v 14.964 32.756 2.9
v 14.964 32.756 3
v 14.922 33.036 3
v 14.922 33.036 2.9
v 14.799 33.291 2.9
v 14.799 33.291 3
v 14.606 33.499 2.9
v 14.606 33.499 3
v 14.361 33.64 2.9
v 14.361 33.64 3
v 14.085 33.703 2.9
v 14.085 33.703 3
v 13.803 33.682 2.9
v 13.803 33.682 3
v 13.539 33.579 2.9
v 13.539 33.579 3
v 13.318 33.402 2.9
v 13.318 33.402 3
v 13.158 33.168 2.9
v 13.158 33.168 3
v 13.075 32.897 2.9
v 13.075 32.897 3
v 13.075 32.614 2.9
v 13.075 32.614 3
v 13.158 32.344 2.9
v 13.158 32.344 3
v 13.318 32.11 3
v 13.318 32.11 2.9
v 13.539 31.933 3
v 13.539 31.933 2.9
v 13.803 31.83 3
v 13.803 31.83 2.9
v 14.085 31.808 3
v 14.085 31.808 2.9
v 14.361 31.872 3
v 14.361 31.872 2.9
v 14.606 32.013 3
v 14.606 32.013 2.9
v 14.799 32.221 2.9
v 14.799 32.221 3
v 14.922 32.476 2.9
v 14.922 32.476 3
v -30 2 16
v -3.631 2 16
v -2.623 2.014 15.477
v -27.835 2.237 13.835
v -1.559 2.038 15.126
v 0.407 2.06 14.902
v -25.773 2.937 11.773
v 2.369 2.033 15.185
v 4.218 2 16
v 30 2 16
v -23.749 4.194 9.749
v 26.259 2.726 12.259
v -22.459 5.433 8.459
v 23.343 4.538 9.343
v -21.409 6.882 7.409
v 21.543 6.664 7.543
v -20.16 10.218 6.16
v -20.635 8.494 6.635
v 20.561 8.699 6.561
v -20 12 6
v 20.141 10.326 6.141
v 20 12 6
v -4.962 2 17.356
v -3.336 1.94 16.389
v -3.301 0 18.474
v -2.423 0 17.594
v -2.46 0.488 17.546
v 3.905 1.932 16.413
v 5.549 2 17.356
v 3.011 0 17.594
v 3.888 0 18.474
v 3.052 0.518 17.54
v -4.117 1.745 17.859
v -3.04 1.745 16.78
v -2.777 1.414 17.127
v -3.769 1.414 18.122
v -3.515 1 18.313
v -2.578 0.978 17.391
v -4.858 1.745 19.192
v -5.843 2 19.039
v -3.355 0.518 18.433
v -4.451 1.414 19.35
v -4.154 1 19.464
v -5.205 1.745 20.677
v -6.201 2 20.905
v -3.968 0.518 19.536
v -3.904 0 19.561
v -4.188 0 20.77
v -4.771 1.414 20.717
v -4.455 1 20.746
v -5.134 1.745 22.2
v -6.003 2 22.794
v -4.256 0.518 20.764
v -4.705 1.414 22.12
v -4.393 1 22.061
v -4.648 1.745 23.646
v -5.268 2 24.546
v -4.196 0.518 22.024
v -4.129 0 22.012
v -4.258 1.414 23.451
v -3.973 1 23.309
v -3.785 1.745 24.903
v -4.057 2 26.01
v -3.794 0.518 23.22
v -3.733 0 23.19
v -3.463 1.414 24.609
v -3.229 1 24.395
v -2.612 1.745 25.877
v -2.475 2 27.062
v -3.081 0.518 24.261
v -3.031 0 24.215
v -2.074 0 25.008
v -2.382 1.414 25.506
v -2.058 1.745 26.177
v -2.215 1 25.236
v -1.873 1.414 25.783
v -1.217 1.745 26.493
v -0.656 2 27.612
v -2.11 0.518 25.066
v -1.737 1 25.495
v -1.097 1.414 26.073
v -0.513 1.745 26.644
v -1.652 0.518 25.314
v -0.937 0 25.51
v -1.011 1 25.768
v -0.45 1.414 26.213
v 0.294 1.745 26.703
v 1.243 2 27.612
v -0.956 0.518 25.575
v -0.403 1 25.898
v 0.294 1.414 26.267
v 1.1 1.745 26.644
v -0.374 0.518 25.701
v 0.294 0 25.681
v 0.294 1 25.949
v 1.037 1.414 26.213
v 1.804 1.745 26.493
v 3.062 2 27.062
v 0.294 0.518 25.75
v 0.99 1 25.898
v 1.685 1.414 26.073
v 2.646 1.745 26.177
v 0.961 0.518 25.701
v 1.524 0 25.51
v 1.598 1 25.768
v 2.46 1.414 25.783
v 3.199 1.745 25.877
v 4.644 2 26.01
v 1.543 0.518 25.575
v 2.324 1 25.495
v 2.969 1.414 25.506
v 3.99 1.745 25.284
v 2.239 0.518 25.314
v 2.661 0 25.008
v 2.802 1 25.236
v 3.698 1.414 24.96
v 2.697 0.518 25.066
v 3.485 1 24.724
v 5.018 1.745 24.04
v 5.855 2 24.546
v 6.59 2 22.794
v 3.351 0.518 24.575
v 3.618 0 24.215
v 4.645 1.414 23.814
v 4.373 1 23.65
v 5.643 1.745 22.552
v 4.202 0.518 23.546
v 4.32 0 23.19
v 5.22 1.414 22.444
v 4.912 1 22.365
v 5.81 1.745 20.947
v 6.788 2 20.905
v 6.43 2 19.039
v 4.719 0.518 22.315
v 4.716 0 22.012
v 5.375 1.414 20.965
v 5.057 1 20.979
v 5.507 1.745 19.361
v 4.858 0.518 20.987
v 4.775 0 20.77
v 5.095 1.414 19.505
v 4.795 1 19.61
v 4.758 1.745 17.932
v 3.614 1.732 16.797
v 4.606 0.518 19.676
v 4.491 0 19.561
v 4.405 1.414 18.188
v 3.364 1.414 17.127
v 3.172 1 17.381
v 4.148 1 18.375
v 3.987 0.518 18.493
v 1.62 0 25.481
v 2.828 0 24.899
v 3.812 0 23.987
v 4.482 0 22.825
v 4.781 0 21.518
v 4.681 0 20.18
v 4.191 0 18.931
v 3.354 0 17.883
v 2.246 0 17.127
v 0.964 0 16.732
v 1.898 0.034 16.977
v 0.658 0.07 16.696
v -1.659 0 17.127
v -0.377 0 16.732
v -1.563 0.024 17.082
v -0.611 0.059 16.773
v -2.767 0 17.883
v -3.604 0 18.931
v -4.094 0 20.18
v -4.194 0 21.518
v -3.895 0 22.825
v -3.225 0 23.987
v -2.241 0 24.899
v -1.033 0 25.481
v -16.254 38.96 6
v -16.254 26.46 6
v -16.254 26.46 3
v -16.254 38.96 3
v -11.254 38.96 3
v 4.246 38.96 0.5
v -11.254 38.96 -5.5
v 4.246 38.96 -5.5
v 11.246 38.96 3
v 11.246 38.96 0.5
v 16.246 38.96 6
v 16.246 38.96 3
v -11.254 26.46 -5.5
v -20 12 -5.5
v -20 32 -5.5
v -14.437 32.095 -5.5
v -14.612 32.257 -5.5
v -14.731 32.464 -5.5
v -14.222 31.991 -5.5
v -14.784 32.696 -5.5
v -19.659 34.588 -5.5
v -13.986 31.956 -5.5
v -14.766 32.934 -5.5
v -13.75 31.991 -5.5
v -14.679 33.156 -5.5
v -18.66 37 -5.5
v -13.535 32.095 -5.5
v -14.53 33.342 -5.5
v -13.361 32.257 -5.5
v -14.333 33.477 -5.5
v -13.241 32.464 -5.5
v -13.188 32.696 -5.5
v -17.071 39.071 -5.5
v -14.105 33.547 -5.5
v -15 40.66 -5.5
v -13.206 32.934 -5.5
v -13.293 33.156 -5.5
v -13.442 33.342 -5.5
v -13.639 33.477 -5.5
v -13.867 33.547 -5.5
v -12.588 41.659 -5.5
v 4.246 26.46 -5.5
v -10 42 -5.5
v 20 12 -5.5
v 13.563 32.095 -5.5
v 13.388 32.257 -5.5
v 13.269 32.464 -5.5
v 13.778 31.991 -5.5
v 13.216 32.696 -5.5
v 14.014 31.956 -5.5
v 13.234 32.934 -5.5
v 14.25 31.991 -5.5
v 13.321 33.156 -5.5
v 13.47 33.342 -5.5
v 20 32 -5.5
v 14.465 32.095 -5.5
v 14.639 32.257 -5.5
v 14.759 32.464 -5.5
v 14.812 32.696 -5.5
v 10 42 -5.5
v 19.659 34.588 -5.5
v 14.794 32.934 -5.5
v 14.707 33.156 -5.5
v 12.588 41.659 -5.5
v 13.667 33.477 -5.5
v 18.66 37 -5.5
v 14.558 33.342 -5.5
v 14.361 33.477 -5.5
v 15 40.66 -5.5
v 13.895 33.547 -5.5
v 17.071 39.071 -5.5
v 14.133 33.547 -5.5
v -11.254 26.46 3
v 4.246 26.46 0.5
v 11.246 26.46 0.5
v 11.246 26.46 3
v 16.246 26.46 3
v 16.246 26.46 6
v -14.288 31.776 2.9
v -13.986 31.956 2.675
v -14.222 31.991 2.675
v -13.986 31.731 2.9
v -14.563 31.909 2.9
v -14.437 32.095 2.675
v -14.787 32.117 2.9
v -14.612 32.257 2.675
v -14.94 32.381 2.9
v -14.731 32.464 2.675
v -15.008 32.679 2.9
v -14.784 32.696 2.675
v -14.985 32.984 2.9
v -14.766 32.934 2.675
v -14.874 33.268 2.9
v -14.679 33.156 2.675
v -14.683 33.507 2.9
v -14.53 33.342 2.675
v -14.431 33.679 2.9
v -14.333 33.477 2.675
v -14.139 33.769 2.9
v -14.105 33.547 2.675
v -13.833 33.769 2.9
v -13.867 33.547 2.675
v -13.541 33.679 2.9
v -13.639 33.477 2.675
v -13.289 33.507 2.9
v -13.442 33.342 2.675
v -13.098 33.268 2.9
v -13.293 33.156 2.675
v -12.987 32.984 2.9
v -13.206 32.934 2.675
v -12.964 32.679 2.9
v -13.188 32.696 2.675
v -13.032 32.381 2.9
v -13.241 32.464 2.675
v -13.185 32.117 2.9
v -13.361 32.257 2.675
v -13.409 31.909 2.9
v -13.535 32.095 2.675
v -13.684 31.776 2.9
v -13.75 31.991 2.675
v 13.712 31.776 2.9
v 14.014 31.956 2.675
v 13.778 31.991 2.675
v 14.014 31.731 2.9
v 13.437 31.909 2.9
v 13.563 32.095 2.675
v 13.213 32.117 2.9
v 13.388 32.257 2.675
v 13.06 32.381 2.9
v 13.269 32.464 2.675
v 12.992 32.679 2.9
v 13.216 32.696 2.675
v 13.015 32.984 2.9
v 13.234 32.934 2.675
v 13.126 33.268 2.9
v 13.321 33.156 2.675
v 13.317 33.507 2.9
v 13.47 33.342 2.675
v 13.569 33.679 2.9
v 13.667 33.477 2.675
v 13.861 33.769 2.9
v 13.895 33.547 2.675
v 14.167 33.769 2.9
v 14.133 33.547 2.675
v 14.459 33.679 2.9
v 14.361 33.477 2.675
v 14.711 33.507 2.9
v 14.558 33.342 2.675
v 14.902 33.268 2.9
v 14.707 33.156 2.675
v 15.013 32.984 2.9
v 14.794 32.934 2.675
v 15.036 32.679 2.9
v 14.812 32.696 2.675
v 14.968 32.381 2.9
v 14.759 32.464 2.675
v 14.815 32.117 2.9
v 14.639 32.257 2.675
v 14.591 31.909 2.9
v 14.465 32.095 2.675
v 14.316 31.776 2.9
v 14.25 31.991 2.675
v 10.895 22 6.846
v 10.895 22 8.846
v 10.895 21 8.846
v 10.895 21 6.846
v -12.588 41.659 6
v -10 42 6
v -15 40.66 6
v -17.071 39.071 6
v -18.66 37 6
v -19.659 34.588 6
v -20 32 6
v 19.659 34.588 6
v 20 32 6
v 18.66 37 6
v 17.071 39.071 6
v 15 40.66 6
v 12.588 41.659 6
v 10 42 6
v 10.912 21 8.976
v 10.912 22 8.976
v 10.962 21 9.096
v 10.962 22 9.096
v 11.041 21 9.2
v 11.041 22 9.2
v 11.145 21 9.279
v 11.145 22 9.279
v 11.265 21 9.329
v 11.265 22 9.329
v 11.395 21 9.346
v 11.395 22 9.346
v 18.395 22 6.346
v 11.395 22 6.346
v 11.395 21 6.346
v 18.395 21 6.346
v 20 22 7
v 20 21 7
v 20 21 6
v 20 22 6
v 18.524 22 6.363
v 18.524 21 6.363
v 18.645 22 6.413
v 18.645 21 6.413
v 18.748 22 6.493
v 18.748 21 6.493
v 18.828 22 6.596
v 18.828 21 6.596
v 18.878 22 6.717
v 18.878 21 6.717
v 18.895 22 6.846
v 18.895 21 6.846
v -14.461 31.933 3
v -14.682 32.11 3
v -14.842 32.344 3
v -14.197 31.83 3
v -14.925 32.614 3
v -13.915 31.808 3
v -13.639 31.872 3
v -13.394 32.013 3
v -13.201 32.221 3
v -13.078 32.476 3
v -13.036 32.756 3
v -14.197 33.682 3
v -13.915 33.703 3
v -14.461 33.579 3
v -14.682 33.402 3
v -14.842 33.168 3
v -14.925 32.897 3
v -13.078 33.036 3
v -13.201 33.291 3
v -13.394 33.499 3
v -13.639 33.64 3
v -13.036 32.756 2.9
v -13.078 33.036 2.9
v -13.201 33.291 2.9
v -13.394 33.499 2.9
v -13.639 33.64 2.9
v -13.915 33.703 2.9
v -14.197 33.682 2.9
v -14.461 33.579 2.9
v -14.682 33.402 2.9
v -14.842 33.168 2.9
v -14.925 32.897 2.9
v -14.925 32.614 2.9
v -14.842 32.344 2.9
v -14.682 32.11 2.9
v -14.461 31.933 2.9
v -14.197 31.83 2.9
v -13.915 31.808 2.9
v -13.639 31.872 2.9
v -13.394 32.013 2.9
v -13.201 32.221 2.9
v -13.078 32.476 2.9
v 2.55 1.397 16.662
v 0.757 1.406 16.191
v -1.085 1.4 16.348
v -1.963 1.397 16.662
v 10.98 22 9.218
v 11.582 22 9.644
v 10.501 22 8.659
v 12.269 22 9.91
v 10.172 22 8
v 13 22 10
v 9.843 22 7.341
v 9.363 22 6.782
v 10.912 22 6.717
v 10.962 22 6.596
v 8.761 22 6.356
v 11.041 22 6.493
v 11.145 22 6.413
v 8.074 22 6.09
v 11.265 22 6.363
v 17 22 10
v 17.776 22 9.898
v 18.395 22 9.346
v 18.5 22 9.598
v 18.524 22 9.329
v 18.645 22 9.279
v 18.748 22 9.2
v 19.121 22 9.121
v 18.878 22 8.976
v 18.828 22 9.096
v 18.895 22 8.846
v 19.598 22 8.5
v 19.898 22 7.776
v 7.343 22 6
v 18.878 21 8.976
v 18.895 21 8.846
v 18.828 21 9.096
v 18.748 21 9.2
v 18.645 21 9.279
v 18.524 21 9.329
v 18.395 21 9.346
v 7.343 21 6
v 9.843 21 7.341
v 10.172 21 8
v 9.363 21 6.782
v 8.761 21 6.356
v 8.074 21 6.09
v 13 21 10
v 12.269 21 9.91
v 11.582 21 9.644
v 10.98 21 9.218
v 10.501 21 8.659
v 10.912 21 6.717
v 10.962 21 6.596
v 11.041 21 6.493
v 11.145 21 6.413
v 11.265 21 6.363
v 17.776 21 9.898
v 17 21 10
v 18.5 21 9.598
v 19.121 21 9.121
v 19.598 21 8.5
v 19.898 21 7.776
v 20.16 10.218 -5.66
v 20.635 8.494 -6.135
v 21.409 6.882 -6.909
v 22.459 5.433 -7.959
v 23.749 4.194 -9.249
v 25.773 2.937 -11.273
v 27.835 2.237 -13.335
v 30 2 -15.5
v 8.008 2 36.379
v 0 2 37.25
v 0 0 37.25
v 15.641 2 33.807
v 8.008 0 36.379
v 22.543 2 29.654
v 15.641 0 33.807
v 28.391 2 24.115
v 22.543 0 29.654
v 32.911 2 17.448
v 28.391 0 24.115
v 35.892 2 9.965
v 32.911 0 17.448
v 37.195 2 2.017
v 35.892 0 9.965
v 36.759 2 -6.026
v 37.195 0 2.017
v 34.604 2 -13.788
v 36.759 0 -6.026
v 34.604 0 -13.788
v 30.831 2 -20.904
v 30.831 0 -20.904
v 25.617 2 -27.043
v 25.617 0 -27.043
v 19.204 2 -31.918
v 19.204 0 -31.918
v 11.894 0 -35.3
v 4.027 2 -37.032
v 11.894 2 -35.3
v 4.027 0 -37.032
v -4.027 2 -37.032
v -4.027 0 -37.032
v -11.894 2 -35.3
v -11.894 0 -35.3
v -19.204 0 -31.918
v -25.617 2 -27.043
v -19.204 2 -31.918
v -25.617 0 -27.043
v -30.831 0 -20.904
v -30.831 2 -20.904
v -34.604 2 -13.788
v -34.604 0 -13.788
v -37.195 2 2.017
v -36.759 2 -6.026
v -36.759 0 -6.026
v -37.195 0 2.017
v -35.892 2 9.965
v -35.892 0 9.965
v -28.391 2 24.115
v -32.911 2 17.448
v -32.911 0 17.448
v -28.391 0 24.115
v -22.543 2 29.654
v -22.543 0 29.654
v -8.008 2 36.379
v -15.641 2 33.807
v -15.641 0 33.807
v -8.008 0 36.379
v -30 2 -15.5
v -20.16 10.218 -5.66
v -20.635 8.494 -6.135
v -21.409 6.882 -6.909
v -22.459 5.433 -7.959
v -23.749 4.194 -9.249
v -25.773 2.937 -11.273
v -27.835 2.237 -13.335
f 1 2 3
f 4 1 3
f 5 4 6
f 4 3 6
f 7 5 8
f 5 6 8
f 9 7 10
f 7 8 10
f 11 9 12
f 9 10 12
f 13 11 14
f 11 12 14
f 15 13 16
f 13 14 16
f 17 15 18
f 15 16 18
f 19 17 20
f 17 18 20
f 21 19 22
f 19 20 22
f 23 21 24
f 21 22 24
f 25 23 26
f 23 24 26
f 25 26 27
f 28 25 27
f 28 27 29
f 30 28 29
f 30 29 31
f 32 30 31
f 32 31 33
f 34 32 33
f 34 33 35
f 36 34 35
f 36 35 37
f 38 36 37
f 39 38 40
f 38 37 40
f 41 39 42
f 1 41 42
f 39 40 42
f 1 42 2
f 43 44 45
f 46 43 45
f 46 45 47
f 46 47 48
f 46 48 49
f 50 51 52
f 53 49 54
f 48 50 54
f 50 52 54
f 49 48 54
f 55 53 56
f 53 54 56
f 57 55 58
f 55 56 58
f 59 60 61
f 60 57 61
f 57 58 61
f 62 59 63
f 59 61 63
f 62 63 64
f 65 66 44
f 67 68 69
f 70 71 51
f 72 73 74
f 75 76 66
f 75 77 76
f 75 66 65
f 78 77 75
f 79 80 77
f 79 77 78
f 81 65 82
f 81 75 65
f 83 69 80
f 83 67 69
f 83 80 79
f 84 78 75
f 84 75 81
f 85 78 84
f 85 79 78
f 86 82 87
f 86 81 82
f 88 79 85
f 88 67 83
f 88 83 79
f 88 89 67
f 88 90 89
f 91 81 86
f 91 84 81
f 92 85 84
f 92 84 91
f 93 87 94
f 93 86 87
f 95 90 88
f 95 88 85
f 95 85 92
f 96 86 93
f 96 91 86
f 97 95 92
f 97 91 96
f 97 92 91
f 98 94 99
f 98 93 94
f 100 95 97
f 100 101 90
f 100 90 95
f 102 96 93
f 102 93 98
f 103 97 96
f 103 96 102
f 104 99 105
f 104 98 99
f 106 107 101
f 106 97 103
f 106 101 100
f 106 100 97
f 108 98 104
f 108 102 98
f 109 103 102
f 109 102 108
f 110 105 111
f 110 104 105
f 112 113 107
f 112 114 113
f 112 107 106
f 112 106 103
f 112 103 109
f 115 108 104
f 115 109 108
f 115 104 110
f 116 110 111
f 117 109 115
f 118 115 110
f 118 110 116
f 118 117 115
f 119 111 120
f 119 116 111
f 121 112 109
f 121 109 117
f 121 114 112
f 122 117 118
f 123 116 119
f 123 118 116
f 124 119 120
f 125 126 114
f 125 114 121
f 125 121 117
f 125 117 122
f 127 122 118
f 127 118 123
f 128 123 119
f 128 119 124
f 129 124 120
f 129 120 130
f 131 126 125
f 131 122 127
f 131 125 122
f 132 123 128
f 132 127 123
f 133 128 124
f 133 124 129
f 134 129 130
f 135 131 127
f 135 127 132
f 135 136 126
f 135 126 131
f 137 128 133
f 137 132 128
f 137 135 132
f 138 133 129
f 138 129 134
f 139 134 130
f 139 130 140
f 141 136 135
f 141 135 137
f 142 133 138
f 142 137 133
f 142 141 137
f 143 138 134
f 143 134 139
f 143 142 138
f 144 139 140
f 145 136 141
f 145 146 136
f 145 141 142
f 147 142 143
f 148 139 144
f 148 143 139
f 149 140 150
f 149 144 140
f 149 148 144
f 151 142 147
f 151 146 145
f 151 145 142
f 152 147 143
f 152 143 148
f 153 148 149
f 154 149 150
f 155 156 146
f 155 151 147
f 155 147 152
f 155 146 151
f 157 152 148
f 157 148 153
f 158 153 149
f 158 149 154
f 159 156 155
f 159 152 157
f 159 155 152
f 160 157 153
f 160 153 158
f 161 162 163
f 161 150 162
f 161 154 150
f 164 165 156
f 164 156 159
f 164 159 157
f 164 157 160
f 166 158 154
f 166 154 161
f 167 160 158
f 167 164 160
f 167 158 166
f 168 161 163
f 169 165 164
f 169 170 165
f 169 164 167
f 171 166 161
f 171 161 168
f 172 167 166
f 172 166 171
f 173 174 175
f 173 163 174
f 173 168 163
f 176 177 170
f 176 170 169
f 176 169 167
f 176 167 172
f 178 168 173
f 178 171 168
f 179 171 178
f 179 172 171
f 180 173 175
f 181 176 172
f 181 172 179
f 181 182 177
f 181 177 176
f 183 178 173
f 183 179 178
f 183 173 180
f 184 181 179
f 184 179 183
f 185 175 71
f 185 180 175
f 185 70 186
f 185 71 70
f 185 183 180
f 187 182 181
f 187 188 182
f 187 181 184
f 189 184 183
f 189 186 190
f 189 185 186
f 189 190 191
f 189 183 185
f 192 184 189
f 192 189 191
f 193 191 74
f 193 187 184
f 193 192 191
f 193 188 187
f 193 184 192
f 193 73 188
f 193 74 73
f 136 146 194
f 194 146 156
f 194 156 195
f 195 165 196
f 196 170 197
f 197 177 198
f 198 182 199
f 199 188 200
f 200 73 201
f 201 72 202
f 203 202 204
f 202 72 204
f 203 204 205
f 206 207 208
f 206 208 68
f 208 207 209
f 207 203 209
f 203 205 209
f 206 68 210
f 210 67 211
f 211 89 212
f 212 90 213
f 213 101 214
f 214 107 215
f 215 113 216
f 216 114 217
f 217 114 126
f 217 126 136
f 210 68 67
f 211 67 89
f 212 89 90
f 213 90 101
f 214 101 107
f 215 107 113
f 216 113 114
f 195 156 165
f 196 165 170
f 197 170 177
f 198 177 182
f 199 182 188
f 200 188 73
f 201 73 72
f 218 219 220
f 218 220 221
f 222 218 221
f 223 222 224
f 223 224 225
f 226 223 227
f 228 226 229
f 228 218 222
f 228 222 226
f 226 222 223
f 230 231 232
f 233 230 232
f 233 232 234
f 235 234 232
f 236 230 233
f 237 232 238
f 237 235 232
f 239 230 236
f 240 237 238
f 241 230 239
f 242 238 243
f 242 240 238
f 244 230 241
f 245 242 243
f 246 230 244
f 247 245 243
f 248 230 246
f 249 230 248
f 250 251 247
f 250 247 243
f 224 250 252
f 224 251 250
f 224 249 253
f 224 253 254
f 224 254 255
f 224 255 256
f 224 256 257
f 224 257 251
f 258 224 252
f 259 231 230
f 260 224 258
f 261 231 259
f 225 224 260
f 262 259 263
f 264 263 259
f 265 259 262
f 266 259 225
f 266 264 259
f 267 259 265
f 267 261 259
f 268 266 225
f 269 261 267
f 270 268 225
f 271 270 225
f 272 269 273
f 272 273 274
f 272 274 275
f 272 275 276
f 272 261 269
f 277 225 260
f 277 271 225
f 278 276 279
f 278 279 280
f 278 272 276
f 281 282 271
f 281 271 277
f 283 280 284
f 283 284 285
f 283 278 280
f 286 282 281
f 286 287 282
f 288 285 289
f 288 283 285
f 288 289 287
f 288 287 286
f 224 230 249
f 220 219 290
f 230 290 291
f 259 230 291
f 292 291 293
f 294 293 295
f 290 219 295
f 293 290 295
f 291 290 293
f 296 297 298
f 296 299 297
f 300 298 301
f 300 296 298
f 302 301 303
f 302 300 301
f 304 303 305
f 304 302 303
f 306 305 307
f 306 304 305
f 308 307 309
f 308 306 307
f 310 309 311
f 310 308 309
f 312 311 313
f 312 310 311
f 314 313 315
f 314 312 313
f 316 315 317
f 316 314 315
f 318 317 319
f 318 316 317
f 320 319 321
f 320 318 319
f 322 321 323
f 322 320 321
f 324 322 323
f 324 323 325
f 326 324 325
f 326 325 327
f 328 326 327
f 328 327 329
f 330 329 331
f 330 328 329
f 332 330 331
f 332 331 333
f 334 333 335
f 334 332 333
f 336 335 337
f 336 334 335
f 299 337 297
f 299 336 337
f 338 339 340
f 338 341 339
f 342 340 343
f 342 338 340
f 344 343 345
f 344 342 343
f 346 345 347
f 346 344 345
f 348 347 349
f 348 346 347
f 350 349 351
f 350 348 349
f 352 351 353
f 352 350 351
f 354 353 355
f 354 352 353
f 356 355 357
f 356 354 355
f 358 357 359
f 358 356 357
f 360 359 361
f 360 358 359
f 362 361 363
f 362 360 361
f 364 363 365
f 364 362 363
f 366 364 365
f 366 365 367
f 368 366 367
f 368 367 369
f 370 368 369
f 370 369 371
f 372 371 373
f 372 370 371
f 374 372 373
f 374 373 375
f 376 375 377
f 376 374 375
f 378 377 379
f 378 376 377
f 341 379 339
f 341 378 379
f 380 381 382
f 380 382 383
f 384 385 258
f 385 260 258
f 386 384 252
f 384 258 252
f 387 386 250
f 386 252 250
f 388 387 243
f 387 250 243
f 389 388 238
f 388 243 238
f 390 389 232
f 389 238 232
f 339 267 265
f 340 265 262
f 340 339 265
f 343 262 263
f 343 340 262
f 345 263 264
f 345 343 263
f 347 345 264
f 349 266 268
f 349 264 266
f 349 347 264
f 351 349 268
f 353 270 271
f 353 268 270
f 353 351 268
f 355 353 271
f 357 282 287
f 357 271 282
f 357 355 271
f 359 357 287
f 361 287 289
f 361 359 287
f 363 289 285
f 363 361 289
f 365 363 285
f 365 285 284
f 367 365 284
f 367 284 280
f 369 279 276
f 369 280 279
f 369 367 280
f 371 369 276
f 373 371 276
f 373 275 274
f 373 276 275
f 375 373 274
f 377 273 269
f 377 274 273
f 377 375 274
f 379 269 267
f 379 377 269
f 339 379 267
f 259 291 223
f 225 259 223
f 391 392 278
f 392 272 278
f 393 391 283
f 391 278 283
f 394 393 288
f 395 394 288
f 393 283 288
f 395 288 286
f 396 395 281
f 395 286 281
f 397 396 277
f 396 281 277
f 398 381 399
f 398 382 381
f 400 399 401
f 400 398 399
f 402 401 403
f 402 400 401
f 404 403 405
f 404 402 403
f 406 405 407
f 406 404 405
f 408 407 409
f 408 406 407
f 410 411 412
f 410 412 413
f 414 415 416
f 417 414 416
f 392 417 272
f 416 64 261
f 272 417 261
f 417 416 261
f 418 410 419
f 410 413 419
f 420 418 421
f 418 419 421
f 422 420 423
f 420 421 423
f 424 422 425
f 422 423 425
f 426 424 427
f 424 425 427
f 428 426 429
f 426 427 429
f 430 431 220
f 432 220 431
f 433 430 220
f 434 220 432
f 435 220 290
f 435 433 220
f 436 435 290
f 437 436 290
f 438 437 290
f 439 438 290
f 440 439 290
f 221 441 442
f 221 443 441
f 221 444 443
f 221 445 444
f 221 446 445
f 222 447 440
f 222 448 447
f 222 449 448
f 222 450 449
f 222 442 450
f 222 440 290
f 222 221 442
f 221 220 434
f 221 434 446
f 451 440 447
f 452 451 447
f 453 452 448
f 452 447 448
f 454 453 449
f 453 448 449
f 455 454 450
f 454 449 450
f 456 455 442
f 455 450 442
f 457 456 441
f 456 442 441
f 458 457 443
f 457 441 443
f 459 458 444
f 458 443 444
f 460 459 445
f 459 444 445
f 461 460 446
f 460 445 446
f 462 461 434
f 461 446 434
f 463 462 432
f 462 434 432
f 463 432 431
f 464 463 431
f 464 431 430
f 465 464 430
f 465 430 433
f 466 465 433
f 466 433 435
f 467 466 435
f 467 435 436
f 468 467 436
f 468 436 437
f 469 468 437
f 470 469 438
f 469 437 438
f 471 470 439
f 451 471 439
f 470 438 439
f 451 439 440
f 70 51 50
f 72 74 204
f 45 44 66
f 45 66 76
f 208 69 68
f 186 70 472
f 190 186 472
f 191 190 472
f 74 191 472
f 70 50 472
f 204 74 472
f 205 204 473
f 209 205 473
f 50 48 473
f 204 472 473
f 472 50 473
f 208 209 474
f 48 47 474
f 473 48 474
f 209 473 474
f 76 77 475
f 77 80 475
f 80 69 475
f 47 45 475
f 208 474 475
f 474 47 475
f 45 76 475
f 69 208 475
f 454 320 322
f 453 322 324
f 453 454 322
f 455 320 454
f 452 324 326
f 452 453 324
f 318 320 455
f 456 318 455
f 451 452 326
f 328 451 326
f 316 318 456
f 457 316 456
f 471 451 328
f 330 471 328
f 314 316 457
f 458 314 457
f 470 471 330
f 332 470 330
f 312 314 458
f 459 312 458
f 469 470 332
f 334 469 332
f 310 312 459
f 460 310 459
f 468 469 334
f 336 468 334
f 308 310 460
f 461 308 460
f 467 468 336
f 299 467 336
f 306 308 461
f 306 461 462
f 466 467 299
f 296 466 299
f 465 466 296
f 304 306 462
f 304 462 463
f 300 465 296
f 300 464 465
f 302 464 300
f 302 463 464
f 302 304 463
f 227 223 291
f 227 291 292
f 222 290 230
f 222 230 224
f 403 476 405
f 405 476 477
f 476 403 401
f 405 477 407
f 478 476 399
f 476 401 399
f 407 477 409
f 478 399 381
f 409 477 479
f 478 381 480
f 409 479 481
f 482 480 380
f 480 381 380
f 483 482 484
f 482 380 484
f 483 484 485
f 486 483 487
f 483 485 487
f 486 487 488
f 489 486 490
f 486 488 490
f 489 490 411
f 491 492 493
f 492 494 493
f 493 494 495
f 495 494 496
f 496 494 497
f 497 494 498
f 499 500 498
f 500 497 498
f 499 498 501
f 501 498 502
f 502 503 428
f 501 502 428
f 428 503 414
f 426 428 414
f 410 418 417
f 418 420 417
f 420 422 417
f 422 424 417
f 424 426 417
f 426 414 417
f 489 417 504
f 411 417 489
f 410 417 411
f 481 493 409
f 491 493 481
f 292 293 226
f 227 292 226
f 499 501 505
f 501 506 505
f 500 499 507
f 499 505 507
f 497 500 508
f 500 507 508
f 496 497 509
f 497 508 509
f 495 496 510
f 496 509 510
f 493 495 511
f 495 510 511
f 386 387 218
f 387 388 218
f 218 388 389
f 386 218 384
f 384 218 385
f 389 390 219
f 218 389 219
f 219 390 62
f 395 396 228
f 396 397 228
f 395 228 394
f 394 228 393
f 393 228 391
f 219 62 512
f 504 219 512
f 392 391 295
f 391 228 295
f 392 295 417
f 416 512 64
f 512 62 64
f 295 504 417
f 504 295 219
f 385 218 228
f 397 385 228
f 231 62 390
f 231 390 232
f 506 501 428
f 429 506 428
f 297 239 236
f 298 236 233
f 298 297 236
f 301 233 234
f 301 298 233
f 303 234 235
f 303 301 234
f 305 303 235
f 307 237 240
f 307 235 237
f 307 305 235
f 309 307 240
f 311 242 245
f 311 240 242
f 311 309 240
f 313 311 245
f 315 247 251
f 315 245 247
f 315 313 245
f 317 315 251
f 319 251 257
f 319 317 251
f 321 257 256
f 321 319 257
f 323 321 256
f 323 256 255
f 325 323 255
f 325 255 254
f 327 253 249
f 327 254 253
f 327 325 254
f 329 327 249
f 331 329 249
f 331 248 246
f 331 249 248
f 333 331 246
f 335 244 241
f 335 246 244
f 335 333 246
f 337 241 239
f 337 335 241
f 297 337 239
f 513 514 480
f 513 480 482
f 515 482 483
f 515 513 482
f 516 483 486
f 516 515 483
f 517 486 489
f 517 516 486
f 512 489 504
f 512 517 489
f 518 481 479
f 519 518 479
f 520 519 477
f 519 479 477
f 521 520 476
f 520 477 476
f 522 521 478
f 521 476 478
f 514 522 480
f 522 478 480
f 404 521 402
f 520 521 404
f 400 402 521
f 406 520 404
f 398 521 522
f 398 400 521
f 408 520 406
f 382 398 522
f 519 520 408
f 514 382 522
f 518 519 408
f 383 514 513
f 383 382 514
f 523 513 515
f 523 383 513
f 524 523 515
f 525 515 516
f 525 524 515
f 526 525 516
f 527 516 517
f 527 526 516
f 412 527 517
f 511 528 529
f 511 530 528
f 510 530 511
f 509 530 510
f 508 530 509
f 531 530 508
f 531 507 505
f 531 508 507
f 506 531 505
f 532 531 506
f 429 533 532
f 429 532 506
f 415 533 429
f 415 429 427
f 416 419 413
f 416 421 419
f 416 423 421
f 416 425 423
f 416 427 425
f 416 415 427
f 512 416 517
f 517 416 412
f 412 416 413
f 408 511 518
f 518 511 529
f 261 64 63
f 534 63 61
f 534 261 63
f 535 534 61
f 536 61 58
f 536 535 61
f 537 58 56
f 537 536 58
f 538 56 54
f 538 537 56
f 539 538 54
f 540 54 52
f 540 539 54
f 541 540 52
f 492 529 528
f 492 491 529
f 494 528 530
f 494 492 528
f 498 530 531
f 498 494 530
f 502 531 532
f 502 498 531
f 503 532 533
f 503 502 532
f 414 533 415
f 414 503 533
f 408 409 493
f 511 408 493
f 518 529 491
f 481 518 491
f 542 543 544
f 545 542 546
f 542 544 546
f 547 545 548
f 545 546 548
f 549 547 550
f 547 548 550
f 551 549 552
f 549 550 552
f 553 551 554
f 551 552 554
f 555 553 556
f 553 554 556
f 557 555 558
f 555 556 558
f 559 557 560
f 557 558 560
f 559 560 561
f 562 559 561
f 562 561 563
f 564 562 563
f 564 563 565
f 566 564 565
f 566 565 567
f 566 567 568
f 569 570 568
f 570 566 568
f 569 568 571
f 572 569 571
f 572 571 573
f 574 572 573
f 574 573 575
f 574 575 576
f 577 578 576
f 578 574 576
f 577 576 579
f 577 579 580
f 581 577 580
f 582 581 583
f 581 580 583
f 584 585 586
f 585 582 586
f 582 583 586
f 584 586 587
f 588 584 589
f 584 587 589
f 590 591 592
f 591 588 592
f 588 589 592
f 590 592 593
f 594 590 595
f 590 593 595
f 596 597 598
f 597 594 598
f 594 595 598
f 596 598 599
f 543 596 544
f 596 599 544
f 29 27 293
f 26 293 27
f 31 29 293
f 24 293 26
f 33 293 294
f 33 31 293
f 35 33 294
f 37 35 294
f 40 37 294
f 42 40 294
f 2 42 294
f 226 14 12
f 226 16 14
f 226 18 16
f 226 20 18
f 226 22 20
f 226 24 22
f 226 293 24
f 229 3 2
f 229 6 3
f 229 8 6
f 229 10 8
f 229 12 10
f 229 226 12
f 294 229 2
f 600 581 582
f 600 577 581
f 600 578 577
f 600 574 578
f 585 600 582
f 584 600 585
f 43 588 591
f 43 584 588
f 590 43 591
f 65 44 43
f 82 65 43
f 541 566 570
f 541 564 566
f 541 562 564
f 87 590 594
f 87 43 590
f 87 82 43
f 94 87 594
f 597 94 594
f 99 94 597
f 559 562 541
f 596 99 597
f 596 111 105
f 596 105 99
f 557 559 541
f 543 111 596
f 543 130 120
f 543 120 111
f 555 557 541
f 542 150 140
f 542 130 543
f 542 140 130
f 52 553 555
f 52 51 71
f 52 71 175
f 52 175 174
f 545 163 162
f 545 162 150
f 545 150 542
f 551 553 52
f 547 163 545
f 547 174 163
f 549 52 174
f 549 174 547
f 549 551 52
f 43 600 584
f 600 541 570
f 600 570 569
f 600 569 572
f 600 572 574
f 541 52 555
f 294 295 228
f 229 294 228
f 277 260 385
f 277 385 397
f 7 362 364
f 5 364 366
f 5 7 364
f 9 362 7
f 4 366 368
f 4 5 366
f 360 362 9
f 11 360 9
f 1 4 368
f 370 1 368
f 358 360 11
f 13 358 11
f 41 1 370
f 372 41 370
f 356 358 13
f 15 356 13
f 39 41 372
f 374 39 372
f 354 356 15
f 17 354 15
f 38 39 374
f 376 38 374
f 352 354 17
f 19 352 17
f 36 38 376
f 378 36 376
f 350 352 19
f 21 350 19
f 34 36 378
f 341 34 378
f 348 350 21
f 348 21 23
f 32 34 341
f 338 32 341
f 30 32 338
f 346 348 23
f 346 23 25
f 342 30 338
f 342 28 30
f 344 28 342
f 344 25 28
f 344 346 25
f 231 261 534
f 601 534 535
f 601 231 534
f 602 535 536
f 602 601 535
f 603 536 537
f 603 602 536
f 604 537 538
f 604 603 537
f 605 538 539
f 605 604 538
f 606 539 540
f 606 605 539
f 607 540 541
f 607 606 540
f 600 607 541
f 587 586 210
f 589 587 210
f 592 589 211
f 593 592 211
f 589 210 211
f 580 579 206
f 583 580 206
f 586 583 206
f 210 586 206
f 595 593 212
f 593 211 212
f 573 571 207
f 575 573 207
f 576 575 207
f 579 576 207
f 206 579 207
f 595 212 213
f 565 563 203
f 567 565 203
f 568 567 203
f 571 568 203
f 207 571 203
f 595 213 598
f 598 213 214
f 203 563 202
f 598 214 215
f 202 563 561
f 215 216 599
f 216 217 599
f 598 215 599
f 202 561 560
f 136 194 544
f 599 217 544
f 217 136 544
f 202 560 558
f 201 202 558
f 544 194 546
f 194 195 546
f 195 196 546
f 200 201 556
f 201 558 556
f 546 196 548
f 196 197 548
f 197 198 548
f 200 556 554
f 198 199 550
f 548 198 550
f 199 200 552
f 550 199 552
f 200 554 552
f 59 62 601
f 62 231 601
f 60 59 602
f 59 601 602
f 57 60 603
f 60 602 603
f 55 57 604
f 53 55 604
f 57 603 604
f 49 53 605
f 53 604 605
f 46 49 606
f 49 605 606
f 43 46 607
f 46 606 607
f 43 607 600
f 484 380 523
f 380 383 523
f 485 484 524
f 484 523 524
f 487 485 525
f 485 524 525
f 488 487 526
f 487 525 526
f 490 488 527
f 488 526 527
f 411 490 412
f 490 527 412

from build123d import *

# Parameters (mm, degrees)
SKETCH1_R                      = 37.25
BOSS_EXTRUDE1_DEPTH            = 2
SKETCH2_W                      = 40
SKETCH2_H                      = 12
BOSS_EXTRUDE4_DEPTH            = 40
SKETCH3_W                      = 32.5
SKETCH3_H                      = 12.5
CUT_EXTRUDE1_DEPTH             = 3
SKETCH4_W                      = 22.5
SKETCH4_H                      = 12.5
CUT_EXTRUDE2_DEPTH             = 2.5
SKETCH5_W                      = 15.5
SKETCH5_H                      = 12.5
CUT_EXTRUDE3_DEPTH             = 6
SKETCH6_W                      = 0.5
SKETCH6_H                      = 40
CUT_EXTRUDE4_DEPTH             = 81.181824624
SKETCH7_R                      = 0.95
CUT_EXTRUDE5_DEPTH             = 0.1
M2X0_4_TAPPED_HOLE1_AT_2_COUNT = 2
M2X0_4_TAPPED_HOLE1_AT_2_PITCH = 28
SKETCH11_W                     = 4
SKETCH11_H                     = 1
BOSS_EXTRUDE9_DEPTH            = 10
CUT_EXTRUDE6_REACH             = 59.089
SKETCH13_W                     = 8
SKETCH13_H                     = 3
FILLET4_R                      = 0.5
FILLET5_R                      = 3
FILLET6_R                      = 3
FILLET7_R                      = 10
FILLET8_R                      = 10
CUT_EXTRUDE7_REACH             = 68.145
SKETCH14_R                     = 4.5
FILLET10_R                     = 2


# Some blends are built 0.0001 mm under size
with BuildPart() as part:
    # Sketch1 → Boss-Extrude1 (new body)
    with BuildSketch(Plane(origin=(0, 0, 0), x_dir=(1, 0, 0), z_dir=(0, 1, 0))):
        with Locations(Location((0, 0, 0), (0, 0, 270))):
            Circle(SKETCH1_R)
    extrude(amount=BOSS_EXTRUDE1_DEPTH)

    # Sketch2 → Boss-Extrude4 (add)
    with BuildSketch(Plane(origin=(0, 2, 0), x_dir=(1, 0, 0), z_dir=(0, 1, 0))):
        Rectangle(SKETCH2_W, SKETCH2_H)
    extrude(amount=BOSS_EXTRUDE4_DEPTH)

    # Sketch3 → Cut-Extrude1 (cut)
    with BuildSketch(Plane.XY.offset(6)):
        with Locations((-0.004059612, 32.710166226)):
            Rectangle(SKETCH3_W, SKETCH3_H)
    extrude(amount=-CUT_EXTRUDE1_DEPTH, mode=Mode.SUBTRACT)

    # Sketch4 → Cut-Extrude2 (cut)
    with BuildSketch(Plane.XY.offset(3)):
        with Locations((-0.004059612, 32.710166226)):
            Rectangle(SKETCH4_W, SKETCH4_H)
    extrude(amount=-CUT_EXTRUDE2_DEPTH, mode=Mode.SUBTRACT)

    # Sketch5 → Cut-Extrude3 (cut)
    with BuildSketch(Plane.XY.offset(0.5)):
        with Locations((-3.504059612, 32.710166226)):
            Rectangle(SKETCH5_W, SKETCH5_H)
    extrude(amount=-CUT_EXTRUDE3_DEPTH, mode=Mode.SUBTRACT)

    # Sketch6 → Cut-Extrude4 (cut, through all)
    with BuildSketch(Plane(origin=(20, 0, 0), x_dir=(0, 0, -1), z_dir=(1, 0, 0))):
        with Locations((5.75, 22)):
            Rectangle(SKETCH6_W, SKETCH6_H)
    extrude(amount=-CUT_EXTRUDE4_DEPTH, mode=Mode.SUBTRACT)

    # Sketch7 → Cut-Extrude5 (cut)
    with BuildSketch(Plane.XY.offset(3)):
        with Locations((14.013948706, 32.755843114)):
            Circle(SKETCH7_R)
        with Locations((-13.986051294, 32.755843114)):
            Circle(SKETCH7_R)
    extrude(amount=-CUT_EXTRUDE5_DEPTH, mode=Mode.SUBTRACT)

    # Sketch9 → M2x0.4 Tapped Hole1 (revolve, cut)
    with BuildSketch(Plane(origin=(-13.986051294, 32.755843114, 2.9), x_dir=(0, -1, 0), z_dir=(1, 0, 0))):
        Polygon((0, 0), (0, 40.15), (0.8, 40.15), (0.8, 0.225), (1.025, 0), align=None)
    m2x0_4_tapped_hole1 = revolve(axis=Axis((-13.986051294, 32.755843114, 9.25), (0, 0, -1)), mode=Mode.SUBTRACT)

    # M2x0.4 Tapped Hole1 at 2: M2x0.4 Tapped Hole1 ×2
    with Locations(*[(i * M2X0_4_TAPPED_HOLE1_AT_2_PITCH, 0, 0) for i in range(1, M2X0_4_TAPPED_HOLE1_AT_2_COUNT)]):
        add(m2x0_4_tapped_hole1, mode=Mode.SUBTRACT)

    # Sketch11 → Boss-Extrude9 (add)
    with BuildSketch(Plane(origin=(20, 0, 0), x_dir=(0, 0, -1), z_dir=(1, 0, 0))):
        with Locations((-8, 21.5)):
            Rectangle(SKETCH11_W, SKETCH11_H)
    extrude(amount=-BOSS_EXTRUDE9_DEPTH)

    # Sketch13 → Cut-Extrude6 (cut, up to next)
    with BuildSketch(Plane(origin=(0, 22, 0), x_dir=(1, 0, 0), z_dir=(0, 1, 0)), mode=Mode.PRIVATE) as cut_extrude6_sk1:
        with Locations((14.894629289, -7.846146156)):
            Rectangle(SKETCH13_W, SKETCH13_H)
    cut_extrude6_tool1 = extrude(cut_extrude6_sk1.sketch, amount=-CUT_EXTRUDE6_REACH, mode=Mode.PRIVATE) & part.part
    add(cut_extrude6_tool1.solids().sort_by_distance((14.894629, 22, 7.846146))[0], mode=Mode.SUBTRACT)

    # Fillet4
    fillet4_edges = [part.edges().sort_by_distance(p)[0] for p in [
        (10.894629289, 21.5, 6.346146156),
        (10.894629289, 21.5, 9.346146156),
        (18.894629289, 21.5, 9.346146156),
        (18.894629289, 21.5, 6.346146156),
    ]]
    fillet(fillet4_edges, radius=FILLET4_R)

    # Fillet5
    fillet5_edges = [part.edges().sort_by_distance(p)[0] for p in [
        (10, 21.5, 10),
        (20, 21.5, 10),
    ]]
    fillet(fillet5_edges, radius=FILLET5_R)

    # Fillet6
    # the kernel refuses this fillet: 3 mm, written as the material it adds along each edge
    with BuildSketch(Plane(origin=(10, 21, 6), x_dir=(0.08547250469841872, 5.30956894242523e-15, 0.9963405296085164), z_dir=(0, 1, 0))) as fillet6_piece_1:
        with BuildLine():
            CenterArc((2.761933602, -2.903549084), FILLET6_R, 104.568024357, 70.528779366)
            Line((-0.227087987, -2.64713157), (-0.525990146, -2.621489819))
            Line((-0.525990146, -2.621489819), (-0.298902159, 0.025641751))
            Line((-0.298902159, 0.025641751), (0.025641751, 0.298902159))
            ThreePointArc((0.025641751, 0.298902159), (1.021982281, 0.213429654), (1.931887045, 0.290354908))
            Line((1.931887045, 0.290354908), (2.007345823, 0))
        make_face()
    extrude(amount=1)

    # Fillet7
    fillet7_edges = [part.edges().sort_by_distance(p)[0] for p in [
        (-20, 2, 0.25),
        (0, 2, -5.5),
        (0, 2, 6),
        (20, 2, 0.25),
    ]]
    fillet(fillet7_edges, radius=FILLET7_R)

    # Fillet8
    fillet8_edges = [part.edges().sort_by_distance(p)[0] for p in [
        (-20, 42, 0.25),
        (20, 42, 0.25),
    ]]
    fillet(fillet8_edges, radius=FILLET8_R)

    # Sketch14 → Cut-Extrude7 (cut, up to next)
    with BuildSketch(Plane(origin=(0, 2, 0), x_dir=(1, 0, 0), z_dir=(0, 1, 0)), mode=Mode.PRIVATE) as cut_extrude7_sk1:
        with Locations(Location((0.293506959, -21.181418859, 0), (0, 0, 270))):
            Circle(SKETCH14_R)
    cut_extrude7_tool1 = extrude(cut_extrude7_sk1.sketch, amount=-CUT_EXTRUDE7_REACH, mode=Mode.PRIVATE) & part.part
    add(cut_extrude7_tool1.solids().sort_by_distance((0.293507, 2, 21.181419))[0], mode=Mode.SUBTRACT)

    # Fillet10
    fillet10_edges = [part.edges().sort_by_distance(p)[0] for p in [
        (0.293506959, 2, 16.681418859),
    ]]
    fillet(fillet10_edges, radius=FILLET10_R - 0.0001)  # a hair under: the kernel refuses the full size


solid = part.part
